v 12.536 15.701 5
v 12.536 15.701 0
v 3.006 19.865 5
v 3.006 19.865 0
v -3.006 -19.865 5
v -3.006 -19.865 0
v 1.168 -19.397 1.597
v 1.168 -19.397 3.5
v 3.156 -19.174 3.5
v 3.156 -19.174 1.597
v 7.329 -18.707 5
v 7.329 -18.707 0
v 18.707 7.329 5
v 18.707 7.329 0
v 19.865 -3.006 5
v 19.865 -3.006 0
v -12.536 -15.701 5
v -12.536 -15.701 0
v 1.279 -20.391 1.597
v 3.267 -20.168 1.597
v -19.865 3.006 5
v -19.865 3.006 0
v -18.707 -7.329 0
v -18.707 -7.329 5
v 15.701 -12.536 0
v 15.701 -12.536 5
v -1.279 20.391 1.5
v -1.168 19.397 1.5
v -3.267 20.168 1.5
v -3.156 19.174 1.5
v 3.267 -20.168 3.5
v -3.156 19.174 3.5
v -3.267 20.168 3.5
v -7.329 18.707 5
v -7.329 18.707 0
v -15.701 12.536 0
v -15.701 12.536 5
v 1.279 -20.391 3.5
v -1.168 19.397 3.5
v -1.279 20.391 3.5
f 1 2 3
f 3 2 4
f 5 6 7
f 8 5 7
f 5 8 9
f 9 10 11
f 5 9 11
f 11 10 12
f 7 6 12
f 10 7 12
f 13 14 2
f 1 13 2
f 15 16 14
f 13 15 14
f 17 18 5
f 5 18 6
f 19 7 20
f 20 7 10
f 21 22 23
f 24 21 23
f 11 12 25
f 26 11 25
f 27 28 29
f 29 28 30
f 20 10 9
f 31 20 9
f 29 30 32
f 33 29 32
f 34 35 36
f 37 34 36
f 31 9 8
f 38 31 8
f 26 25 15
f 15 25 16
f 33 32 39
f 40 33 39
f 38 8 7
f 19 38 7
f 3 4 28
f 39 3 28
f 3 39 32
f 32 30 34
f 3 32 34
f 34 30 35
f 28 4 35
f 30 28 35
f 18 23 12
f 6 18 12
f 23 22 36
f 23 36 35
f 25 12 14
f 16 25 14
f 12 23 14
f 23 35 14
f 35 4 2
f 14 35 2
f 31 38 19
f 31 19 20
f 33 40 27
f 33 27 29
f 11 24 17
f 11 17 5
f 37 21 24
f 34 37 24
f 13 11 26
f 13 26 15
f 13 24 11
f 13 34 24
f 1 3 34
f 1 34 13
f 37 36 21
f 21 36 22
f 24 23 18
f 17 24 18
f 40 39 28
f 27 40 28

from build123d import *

# Parameters (mm, degrees)
F1_DEPTH = 5
F3_DEPTH = 1
F5_DEPTH = 1


with BuildPart() as f1:
    # F0 (on Top) → F1 (new body)
    with BuildSketch(Plane.XY):
        Polygon((18.706655, 7.32937), (12.535754, 15.700748), (3.005907, 19.865124), (-7.32937, 18.706655), (-15.700748, 12.535754), (-19.865124, 3.005907), (-18.706655, -7.32937), (-12.535754, -15.700748), (-3.005907, -19.865124), (7.32937, -18.706655), (15.700748, -12.535754), (19.865124, -3.005907), align=None)
    extrude(amount=F1_DEPTH)

    # F2 (on face) → F3 (join)
    with BuildSketch(Plane(origin=(-2.161731, 19.285889, 0), x_dir=(-0.993777, -0.111391, 0), z_dir=(-0.111391, 0.993777, 0))):
        Polygon((1, 3.5), (0, 3.5), (-1, 3.5), (-1, 1.5), (0, 1.5), (1, 1.5), align=None)
    extrude(amount=F3_DEPTH)

    # F4 (on face) → F5 (join)
    with BuildSketch(Plane(origin=(2.161731, -19.285889, 0), x_dir=(0.993777, 0.111391, 0), z_dir=(0.111391, -0.993777, 0))):
        Polygon((1, 3.5), (0, 3.5), (-1, 3.5), (-1, 1.597076), (1, 1.597076), align=None)
    extrude(amount=F5_DEPTH)


solid = f1.part
